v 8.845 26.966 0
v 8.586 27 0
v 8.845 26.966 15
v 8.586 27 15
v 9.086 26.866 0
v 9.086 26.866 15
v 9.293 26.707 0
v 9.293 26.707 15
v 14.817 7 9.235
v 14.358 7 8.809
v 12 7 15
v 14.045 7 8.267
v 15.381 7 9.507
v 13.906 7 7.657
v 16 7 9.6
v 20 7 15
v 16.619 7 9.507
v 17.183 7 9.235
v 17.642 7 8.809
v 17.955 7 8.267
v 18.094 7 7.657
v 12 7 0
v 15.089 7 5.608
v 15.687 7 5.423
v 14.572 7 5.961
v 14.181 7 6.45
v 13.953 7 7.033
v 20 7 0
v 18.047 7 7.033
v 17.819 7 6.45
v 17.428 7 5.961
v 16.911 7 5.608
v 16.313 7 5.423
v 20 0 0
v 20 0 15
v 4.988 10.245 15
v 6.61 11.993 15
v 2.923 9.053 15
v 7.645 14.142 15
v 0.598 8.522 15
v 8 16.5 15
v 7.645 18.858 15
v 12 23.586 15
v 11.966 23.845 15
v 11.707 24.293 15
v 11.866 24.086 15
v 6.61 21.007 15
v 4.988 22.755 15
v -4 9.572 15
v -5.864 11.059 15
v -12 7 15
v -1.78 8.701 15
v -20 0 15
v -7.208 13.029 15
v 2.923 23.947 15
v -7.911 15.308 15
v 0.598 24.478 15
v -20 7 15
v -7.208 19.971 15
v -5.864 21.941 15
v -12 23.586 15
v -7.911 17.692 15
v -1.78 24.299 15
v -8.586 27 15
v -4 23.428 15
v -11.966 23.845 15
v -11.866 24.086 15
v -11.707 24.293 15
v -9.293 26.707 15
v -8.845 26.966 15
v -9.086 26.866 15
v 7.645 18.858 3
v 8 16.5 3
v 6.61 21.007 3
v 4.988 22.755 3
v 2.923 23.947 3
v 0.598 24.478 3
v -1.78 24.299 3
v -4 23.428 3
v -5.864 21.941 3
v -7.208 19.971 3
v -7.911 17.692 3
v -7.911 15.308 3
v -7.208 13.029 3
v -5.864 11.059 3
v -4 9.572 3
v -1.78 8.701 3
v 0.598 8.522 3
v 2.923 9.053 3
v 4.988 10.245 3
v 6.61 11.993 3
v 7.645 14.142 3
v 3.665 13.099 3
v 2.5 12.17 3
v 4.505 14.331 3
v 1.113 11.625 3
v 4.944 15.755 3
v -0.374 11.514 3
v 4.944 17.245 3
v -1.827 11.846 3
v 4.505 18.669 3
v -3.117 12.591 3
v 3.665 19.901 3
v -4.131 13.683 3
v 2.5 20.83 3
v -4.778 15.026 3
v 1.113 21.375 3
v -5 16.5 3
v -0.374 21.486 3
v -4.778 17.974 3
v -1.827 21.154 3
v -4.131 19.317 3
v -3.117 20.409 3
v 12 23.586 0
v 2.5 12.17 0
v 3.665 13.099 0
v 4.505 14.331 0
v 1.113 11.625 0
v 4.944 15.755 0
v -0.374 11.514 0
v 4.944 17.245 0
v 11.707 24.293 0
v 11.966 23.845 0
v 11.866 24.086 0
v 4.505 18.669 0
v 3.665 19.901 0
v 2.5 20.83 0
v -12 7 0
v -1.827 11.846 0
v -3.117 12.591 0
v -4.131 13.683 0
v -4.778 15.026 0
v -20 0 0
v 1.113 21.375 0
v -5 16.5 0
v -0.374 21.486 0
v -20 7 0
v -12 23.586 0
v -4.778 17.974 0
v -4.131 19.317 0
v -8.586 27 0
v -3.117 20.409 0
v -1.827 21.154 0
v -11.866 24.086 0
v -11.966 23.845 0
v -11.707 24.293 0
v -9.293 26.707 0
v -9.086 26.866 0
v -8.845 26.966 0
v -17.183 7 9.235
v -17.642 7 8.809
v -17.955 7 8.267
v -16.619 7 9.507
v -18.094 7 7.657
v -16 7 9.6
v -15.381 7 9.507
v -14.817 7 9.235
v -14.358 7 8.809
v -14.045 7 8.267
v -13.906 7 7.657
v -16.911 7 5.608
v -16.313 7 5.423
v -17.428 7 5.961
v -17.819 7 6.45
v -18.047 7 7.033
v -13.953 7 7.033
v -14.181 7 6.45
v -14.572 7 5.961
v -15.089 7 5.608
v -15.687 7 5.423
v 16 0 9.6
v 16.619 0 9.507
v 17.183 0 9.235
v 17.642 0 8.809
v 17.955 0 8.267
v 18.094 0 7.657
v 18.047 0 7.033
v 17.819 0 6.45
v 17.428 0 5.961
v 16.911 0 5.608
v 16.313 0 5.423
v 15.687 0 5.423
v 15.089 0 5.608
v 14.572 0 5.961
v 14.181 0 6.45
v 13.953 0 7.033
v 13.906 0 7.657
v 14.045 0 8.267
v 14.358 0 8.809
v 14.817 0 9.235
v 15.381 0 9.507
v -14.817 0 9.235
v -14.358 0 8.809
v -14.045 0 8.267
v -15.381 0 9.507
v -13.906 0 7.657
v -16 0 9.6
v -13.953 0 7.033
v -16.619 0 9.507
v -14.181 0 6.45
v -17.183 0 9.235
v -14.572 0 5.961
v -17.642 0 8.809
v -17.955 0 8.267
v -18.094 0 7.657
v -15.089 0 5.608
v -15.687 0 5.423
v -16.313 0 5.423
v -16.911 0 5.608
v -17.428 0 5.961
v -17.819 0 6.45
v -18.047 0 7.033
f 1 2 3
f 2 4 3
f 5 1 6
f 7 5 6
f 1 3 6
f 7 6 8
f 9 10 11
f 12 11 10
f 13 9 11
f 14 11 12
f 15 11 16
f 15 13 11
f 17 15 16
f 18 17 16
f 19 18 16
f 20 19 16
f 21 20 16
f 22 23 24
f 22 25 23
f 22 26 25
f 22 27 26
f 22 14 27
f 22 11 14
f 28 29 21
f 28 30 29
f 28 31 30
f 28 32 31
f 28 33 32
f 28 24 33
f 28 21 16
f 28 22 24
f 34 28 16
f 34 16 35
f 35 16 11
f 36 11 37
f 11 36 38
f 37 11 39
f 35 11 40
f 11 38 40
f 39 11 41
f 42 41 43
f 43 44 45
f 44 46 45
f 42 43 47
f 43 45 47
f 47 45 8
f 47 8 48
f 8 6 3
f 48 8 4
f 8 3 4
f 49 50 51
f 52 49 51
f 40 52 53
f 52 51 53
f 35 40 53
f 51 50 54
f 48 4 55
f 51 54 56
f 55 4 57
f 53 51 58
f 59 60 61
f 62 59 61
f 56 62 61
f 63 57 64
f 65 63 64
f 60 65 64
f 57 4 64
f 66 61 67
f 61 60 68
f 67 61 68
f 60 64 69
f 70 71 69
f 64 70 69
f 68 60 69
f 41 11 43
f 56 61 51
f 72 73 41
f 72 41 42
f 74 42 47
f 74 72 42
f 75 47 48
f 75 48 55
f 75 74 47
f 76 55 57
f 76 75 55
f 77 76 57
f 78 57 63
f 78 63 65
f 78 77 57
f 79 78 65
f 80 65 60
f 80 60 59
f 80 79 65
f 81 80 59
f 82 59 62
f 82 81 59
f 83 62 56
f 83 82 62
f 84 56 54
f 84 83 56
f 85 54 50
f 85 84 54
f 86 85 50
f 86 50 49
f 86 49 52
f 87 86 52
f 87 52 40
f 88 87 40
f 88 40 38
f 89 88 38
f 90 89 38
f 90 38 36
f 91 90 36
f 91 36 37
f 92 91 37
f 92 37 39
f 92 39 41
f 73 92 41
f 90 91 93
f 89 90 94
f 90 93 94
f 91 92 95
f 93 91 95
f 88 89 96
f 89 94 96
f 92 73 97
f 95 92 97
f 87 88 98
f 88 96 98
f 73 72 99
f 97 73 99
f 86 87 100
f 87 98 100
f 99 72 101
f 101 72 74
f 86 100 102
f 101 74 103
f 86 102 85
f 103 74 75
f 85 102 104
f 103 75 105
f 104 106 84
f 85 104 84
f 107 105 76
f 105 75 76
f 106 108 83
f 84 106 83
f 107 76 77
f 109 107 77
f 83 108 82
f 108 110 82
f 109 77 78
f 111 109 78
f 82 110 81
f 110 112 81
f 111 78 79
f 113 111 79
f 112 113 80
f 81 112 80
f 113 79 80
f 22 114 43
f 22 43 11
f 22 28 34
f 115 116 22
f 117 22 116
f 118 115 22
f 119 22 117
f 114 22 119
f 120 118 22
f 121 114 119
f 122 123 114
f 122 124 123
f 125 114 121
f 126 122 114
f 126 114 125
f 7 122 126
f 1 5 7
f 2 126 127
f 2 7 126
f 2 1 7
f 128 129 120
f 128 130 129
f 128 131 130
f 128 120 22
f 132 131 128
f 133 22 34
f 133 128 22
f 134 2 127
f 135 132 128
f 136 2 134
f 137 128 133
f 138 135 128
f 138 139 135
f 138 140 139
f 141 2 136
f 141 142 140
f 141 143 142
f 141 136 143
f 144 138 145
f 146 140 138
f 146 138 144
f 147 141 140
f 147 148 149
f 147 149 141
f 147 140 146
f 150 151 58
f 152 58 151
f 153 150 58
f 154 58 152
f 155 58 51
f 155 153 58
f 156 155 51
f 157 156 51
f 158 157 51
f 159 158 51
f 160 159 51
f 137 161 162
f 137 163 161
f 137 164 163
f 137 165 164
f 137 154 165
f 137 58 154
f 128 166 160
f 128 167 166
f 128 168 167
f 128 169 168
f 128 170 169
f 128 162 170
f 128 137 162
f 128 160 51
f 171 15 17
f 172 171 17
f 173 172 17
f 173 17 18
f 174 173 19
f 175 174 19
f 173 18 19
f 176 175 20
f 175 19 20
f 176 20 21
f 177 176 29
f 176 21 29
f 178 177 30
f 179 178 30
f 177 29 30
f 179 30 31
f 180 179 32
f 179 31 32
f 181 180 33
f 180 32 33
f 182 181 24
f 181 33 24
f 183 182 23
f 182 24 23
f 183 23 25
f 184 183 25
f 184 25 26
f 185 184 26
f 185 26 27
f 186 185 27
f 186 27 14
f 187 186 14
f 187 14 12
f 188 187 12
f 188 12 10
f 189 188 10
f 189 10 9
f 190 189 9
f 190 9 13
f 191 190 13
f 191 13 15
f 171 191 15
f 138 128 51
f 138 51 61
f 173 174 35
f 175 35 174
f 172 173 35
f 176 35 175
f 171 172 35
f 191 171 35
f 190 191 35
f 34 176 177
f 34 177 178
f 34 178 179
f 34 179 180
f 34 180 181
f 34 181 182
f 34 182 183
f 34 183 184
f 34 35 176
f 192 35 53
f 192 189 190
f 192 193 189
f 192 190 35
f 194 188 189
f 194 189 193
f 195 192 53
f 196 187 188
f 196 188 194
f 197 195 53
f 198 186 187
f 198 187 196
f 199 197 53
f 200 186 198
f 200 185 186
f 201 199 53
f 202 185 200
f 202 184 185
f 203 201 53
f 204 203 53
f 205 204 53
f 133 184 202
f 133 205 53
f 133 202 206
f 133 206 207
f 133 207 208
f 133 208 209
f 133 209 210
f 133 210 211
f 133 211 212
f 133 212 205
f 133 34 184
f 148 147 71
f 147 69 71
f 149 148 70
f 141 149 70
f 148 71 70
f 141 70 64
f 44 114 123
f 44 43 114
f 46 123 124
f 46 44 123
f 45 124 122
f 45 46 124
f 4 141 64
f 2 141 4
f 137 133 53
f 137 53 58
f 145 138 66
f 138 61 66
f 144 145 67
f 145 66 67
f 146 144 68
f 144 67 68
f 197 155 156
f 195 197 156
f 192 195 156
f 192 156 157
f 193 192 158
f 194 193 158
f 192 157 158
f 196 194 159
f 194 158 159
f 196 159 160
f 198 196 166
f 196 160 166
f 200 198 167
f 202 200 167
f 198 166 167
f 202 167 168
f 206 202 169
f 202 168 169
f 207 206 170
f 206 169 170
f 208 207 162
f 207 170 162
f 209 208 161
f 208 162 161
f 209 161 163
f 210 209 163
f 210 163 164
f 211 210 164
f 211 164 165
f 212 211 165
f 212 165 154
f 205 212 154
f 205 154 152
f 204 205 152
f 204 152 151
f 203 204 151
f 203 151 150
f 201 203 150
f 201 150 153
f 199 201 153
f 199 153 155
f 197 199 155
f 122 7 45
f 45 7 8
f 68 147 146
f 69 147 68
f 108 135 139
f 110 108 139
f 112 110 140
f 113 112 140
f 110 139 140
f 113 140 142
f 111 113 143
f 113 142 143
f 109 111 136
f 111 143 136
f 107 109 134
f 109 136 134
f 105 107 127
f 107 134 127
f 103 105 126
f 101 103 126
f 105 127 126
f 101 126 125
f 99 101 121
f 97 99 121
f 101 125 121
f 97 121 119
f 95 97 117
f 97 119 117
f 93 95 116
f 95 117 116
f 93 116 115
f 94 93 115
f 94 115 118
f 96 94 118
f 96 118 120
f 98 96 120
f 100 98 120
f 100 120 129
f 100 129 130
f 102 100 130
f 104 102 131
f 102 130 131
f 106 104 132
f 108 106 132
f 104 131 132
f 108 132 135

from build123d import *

# Parameters (mm, degrees)
SKETCH1_R             = 8
BOSS_EXTRUDE1_DEPTH   = 15
CHAMFER1_SIZE         = 3
SKETCH2_R             = 8
SKETCH2_R_2           = 5
BOSS_EXTRUDE2_DEPTH   = 3
M5_TAPPED_HOLE1_D     = 4.2
M5_TAPPED_HOLE1_DEPTH = 103.56
M5_TAPPED_HOLE1_TIP   = 1.2618073
FILLET1_R             = 1


with BuildPart() as part:
    # Sketch1 → Boss-Extrude1 (new body)
    with BuildSketch(Plane.XY):
        Polygon((20, 0), (-20, 0), (-20, 7), (-12, 7), (-12, 27), (12, 27), (12, 7), (20, 7), align=None)
        with Locations((0, 16.5)):
            Circle(SKETCH1_R, mode=Mode.SUBTRACT)
    extrude(amount=BOSS_EXTRUDE1_DEPTH)

    # Chamfer1
    chamfer1_edges = [part.edges().sort_by_distance(p)[0] for p in [
        (-12, 27, 7.5),
        (12, 27, 7.5),
    ]]
    chamfer(chamfer1_edges, length=CHAMFER1_SIZE)

    # Sketch2 → Boss-Extrude2 (add)
    with BuildSketch(Plane(origin=(0, 0, 0), x_dir=(-1, 0, 0), z_dir=(0, 0, -1))):
        with Locations((0, 16.5)):
            Circle(SKETCH2_R)
        with Locations((0, 16.5)):
            Circle(SKETCH2_R_2, mode=Mode.SUBTRACT)
    extrude(amount=-BOSS_EXTRUDE2_DEPTH)

    # M5 Tapped Hole1
    with Locations(Plane(origin=(-16, 0, 7.5), x_dir=(0, 0, -1), z_dir=(0, -1, 0))):
        with Locations((0, 0), (0, 32)):
            Hole(M5_TAPPED_HOLE1_D / 2, depth=M5_TAPPED_HOLE1_DEPTH)
            with Locations((0, 0, -(M5_TAPPED_HOLE1_DEPTH + M5_TAPPED_HOLE1_TIP / 2))):  # 118° drill point
                Cone(0, M5_TAPPED_HOLE1_D / 2, M5_TAPPED_HOLE1_TIP, mode=Mode.SUBTRACT)

    # Fillet1
    fillet1_edges = [part.edges().sort_by_distance(p)[0] for p in [
        (-12, 24, 7.5),
        (9, 27, 7.5),
        (-9, 27, 7.5),
        (12, 24, 7.5),
    ]]
    fillet(fillet1_edges, radius=FILLET1_R)


solid = part.part
